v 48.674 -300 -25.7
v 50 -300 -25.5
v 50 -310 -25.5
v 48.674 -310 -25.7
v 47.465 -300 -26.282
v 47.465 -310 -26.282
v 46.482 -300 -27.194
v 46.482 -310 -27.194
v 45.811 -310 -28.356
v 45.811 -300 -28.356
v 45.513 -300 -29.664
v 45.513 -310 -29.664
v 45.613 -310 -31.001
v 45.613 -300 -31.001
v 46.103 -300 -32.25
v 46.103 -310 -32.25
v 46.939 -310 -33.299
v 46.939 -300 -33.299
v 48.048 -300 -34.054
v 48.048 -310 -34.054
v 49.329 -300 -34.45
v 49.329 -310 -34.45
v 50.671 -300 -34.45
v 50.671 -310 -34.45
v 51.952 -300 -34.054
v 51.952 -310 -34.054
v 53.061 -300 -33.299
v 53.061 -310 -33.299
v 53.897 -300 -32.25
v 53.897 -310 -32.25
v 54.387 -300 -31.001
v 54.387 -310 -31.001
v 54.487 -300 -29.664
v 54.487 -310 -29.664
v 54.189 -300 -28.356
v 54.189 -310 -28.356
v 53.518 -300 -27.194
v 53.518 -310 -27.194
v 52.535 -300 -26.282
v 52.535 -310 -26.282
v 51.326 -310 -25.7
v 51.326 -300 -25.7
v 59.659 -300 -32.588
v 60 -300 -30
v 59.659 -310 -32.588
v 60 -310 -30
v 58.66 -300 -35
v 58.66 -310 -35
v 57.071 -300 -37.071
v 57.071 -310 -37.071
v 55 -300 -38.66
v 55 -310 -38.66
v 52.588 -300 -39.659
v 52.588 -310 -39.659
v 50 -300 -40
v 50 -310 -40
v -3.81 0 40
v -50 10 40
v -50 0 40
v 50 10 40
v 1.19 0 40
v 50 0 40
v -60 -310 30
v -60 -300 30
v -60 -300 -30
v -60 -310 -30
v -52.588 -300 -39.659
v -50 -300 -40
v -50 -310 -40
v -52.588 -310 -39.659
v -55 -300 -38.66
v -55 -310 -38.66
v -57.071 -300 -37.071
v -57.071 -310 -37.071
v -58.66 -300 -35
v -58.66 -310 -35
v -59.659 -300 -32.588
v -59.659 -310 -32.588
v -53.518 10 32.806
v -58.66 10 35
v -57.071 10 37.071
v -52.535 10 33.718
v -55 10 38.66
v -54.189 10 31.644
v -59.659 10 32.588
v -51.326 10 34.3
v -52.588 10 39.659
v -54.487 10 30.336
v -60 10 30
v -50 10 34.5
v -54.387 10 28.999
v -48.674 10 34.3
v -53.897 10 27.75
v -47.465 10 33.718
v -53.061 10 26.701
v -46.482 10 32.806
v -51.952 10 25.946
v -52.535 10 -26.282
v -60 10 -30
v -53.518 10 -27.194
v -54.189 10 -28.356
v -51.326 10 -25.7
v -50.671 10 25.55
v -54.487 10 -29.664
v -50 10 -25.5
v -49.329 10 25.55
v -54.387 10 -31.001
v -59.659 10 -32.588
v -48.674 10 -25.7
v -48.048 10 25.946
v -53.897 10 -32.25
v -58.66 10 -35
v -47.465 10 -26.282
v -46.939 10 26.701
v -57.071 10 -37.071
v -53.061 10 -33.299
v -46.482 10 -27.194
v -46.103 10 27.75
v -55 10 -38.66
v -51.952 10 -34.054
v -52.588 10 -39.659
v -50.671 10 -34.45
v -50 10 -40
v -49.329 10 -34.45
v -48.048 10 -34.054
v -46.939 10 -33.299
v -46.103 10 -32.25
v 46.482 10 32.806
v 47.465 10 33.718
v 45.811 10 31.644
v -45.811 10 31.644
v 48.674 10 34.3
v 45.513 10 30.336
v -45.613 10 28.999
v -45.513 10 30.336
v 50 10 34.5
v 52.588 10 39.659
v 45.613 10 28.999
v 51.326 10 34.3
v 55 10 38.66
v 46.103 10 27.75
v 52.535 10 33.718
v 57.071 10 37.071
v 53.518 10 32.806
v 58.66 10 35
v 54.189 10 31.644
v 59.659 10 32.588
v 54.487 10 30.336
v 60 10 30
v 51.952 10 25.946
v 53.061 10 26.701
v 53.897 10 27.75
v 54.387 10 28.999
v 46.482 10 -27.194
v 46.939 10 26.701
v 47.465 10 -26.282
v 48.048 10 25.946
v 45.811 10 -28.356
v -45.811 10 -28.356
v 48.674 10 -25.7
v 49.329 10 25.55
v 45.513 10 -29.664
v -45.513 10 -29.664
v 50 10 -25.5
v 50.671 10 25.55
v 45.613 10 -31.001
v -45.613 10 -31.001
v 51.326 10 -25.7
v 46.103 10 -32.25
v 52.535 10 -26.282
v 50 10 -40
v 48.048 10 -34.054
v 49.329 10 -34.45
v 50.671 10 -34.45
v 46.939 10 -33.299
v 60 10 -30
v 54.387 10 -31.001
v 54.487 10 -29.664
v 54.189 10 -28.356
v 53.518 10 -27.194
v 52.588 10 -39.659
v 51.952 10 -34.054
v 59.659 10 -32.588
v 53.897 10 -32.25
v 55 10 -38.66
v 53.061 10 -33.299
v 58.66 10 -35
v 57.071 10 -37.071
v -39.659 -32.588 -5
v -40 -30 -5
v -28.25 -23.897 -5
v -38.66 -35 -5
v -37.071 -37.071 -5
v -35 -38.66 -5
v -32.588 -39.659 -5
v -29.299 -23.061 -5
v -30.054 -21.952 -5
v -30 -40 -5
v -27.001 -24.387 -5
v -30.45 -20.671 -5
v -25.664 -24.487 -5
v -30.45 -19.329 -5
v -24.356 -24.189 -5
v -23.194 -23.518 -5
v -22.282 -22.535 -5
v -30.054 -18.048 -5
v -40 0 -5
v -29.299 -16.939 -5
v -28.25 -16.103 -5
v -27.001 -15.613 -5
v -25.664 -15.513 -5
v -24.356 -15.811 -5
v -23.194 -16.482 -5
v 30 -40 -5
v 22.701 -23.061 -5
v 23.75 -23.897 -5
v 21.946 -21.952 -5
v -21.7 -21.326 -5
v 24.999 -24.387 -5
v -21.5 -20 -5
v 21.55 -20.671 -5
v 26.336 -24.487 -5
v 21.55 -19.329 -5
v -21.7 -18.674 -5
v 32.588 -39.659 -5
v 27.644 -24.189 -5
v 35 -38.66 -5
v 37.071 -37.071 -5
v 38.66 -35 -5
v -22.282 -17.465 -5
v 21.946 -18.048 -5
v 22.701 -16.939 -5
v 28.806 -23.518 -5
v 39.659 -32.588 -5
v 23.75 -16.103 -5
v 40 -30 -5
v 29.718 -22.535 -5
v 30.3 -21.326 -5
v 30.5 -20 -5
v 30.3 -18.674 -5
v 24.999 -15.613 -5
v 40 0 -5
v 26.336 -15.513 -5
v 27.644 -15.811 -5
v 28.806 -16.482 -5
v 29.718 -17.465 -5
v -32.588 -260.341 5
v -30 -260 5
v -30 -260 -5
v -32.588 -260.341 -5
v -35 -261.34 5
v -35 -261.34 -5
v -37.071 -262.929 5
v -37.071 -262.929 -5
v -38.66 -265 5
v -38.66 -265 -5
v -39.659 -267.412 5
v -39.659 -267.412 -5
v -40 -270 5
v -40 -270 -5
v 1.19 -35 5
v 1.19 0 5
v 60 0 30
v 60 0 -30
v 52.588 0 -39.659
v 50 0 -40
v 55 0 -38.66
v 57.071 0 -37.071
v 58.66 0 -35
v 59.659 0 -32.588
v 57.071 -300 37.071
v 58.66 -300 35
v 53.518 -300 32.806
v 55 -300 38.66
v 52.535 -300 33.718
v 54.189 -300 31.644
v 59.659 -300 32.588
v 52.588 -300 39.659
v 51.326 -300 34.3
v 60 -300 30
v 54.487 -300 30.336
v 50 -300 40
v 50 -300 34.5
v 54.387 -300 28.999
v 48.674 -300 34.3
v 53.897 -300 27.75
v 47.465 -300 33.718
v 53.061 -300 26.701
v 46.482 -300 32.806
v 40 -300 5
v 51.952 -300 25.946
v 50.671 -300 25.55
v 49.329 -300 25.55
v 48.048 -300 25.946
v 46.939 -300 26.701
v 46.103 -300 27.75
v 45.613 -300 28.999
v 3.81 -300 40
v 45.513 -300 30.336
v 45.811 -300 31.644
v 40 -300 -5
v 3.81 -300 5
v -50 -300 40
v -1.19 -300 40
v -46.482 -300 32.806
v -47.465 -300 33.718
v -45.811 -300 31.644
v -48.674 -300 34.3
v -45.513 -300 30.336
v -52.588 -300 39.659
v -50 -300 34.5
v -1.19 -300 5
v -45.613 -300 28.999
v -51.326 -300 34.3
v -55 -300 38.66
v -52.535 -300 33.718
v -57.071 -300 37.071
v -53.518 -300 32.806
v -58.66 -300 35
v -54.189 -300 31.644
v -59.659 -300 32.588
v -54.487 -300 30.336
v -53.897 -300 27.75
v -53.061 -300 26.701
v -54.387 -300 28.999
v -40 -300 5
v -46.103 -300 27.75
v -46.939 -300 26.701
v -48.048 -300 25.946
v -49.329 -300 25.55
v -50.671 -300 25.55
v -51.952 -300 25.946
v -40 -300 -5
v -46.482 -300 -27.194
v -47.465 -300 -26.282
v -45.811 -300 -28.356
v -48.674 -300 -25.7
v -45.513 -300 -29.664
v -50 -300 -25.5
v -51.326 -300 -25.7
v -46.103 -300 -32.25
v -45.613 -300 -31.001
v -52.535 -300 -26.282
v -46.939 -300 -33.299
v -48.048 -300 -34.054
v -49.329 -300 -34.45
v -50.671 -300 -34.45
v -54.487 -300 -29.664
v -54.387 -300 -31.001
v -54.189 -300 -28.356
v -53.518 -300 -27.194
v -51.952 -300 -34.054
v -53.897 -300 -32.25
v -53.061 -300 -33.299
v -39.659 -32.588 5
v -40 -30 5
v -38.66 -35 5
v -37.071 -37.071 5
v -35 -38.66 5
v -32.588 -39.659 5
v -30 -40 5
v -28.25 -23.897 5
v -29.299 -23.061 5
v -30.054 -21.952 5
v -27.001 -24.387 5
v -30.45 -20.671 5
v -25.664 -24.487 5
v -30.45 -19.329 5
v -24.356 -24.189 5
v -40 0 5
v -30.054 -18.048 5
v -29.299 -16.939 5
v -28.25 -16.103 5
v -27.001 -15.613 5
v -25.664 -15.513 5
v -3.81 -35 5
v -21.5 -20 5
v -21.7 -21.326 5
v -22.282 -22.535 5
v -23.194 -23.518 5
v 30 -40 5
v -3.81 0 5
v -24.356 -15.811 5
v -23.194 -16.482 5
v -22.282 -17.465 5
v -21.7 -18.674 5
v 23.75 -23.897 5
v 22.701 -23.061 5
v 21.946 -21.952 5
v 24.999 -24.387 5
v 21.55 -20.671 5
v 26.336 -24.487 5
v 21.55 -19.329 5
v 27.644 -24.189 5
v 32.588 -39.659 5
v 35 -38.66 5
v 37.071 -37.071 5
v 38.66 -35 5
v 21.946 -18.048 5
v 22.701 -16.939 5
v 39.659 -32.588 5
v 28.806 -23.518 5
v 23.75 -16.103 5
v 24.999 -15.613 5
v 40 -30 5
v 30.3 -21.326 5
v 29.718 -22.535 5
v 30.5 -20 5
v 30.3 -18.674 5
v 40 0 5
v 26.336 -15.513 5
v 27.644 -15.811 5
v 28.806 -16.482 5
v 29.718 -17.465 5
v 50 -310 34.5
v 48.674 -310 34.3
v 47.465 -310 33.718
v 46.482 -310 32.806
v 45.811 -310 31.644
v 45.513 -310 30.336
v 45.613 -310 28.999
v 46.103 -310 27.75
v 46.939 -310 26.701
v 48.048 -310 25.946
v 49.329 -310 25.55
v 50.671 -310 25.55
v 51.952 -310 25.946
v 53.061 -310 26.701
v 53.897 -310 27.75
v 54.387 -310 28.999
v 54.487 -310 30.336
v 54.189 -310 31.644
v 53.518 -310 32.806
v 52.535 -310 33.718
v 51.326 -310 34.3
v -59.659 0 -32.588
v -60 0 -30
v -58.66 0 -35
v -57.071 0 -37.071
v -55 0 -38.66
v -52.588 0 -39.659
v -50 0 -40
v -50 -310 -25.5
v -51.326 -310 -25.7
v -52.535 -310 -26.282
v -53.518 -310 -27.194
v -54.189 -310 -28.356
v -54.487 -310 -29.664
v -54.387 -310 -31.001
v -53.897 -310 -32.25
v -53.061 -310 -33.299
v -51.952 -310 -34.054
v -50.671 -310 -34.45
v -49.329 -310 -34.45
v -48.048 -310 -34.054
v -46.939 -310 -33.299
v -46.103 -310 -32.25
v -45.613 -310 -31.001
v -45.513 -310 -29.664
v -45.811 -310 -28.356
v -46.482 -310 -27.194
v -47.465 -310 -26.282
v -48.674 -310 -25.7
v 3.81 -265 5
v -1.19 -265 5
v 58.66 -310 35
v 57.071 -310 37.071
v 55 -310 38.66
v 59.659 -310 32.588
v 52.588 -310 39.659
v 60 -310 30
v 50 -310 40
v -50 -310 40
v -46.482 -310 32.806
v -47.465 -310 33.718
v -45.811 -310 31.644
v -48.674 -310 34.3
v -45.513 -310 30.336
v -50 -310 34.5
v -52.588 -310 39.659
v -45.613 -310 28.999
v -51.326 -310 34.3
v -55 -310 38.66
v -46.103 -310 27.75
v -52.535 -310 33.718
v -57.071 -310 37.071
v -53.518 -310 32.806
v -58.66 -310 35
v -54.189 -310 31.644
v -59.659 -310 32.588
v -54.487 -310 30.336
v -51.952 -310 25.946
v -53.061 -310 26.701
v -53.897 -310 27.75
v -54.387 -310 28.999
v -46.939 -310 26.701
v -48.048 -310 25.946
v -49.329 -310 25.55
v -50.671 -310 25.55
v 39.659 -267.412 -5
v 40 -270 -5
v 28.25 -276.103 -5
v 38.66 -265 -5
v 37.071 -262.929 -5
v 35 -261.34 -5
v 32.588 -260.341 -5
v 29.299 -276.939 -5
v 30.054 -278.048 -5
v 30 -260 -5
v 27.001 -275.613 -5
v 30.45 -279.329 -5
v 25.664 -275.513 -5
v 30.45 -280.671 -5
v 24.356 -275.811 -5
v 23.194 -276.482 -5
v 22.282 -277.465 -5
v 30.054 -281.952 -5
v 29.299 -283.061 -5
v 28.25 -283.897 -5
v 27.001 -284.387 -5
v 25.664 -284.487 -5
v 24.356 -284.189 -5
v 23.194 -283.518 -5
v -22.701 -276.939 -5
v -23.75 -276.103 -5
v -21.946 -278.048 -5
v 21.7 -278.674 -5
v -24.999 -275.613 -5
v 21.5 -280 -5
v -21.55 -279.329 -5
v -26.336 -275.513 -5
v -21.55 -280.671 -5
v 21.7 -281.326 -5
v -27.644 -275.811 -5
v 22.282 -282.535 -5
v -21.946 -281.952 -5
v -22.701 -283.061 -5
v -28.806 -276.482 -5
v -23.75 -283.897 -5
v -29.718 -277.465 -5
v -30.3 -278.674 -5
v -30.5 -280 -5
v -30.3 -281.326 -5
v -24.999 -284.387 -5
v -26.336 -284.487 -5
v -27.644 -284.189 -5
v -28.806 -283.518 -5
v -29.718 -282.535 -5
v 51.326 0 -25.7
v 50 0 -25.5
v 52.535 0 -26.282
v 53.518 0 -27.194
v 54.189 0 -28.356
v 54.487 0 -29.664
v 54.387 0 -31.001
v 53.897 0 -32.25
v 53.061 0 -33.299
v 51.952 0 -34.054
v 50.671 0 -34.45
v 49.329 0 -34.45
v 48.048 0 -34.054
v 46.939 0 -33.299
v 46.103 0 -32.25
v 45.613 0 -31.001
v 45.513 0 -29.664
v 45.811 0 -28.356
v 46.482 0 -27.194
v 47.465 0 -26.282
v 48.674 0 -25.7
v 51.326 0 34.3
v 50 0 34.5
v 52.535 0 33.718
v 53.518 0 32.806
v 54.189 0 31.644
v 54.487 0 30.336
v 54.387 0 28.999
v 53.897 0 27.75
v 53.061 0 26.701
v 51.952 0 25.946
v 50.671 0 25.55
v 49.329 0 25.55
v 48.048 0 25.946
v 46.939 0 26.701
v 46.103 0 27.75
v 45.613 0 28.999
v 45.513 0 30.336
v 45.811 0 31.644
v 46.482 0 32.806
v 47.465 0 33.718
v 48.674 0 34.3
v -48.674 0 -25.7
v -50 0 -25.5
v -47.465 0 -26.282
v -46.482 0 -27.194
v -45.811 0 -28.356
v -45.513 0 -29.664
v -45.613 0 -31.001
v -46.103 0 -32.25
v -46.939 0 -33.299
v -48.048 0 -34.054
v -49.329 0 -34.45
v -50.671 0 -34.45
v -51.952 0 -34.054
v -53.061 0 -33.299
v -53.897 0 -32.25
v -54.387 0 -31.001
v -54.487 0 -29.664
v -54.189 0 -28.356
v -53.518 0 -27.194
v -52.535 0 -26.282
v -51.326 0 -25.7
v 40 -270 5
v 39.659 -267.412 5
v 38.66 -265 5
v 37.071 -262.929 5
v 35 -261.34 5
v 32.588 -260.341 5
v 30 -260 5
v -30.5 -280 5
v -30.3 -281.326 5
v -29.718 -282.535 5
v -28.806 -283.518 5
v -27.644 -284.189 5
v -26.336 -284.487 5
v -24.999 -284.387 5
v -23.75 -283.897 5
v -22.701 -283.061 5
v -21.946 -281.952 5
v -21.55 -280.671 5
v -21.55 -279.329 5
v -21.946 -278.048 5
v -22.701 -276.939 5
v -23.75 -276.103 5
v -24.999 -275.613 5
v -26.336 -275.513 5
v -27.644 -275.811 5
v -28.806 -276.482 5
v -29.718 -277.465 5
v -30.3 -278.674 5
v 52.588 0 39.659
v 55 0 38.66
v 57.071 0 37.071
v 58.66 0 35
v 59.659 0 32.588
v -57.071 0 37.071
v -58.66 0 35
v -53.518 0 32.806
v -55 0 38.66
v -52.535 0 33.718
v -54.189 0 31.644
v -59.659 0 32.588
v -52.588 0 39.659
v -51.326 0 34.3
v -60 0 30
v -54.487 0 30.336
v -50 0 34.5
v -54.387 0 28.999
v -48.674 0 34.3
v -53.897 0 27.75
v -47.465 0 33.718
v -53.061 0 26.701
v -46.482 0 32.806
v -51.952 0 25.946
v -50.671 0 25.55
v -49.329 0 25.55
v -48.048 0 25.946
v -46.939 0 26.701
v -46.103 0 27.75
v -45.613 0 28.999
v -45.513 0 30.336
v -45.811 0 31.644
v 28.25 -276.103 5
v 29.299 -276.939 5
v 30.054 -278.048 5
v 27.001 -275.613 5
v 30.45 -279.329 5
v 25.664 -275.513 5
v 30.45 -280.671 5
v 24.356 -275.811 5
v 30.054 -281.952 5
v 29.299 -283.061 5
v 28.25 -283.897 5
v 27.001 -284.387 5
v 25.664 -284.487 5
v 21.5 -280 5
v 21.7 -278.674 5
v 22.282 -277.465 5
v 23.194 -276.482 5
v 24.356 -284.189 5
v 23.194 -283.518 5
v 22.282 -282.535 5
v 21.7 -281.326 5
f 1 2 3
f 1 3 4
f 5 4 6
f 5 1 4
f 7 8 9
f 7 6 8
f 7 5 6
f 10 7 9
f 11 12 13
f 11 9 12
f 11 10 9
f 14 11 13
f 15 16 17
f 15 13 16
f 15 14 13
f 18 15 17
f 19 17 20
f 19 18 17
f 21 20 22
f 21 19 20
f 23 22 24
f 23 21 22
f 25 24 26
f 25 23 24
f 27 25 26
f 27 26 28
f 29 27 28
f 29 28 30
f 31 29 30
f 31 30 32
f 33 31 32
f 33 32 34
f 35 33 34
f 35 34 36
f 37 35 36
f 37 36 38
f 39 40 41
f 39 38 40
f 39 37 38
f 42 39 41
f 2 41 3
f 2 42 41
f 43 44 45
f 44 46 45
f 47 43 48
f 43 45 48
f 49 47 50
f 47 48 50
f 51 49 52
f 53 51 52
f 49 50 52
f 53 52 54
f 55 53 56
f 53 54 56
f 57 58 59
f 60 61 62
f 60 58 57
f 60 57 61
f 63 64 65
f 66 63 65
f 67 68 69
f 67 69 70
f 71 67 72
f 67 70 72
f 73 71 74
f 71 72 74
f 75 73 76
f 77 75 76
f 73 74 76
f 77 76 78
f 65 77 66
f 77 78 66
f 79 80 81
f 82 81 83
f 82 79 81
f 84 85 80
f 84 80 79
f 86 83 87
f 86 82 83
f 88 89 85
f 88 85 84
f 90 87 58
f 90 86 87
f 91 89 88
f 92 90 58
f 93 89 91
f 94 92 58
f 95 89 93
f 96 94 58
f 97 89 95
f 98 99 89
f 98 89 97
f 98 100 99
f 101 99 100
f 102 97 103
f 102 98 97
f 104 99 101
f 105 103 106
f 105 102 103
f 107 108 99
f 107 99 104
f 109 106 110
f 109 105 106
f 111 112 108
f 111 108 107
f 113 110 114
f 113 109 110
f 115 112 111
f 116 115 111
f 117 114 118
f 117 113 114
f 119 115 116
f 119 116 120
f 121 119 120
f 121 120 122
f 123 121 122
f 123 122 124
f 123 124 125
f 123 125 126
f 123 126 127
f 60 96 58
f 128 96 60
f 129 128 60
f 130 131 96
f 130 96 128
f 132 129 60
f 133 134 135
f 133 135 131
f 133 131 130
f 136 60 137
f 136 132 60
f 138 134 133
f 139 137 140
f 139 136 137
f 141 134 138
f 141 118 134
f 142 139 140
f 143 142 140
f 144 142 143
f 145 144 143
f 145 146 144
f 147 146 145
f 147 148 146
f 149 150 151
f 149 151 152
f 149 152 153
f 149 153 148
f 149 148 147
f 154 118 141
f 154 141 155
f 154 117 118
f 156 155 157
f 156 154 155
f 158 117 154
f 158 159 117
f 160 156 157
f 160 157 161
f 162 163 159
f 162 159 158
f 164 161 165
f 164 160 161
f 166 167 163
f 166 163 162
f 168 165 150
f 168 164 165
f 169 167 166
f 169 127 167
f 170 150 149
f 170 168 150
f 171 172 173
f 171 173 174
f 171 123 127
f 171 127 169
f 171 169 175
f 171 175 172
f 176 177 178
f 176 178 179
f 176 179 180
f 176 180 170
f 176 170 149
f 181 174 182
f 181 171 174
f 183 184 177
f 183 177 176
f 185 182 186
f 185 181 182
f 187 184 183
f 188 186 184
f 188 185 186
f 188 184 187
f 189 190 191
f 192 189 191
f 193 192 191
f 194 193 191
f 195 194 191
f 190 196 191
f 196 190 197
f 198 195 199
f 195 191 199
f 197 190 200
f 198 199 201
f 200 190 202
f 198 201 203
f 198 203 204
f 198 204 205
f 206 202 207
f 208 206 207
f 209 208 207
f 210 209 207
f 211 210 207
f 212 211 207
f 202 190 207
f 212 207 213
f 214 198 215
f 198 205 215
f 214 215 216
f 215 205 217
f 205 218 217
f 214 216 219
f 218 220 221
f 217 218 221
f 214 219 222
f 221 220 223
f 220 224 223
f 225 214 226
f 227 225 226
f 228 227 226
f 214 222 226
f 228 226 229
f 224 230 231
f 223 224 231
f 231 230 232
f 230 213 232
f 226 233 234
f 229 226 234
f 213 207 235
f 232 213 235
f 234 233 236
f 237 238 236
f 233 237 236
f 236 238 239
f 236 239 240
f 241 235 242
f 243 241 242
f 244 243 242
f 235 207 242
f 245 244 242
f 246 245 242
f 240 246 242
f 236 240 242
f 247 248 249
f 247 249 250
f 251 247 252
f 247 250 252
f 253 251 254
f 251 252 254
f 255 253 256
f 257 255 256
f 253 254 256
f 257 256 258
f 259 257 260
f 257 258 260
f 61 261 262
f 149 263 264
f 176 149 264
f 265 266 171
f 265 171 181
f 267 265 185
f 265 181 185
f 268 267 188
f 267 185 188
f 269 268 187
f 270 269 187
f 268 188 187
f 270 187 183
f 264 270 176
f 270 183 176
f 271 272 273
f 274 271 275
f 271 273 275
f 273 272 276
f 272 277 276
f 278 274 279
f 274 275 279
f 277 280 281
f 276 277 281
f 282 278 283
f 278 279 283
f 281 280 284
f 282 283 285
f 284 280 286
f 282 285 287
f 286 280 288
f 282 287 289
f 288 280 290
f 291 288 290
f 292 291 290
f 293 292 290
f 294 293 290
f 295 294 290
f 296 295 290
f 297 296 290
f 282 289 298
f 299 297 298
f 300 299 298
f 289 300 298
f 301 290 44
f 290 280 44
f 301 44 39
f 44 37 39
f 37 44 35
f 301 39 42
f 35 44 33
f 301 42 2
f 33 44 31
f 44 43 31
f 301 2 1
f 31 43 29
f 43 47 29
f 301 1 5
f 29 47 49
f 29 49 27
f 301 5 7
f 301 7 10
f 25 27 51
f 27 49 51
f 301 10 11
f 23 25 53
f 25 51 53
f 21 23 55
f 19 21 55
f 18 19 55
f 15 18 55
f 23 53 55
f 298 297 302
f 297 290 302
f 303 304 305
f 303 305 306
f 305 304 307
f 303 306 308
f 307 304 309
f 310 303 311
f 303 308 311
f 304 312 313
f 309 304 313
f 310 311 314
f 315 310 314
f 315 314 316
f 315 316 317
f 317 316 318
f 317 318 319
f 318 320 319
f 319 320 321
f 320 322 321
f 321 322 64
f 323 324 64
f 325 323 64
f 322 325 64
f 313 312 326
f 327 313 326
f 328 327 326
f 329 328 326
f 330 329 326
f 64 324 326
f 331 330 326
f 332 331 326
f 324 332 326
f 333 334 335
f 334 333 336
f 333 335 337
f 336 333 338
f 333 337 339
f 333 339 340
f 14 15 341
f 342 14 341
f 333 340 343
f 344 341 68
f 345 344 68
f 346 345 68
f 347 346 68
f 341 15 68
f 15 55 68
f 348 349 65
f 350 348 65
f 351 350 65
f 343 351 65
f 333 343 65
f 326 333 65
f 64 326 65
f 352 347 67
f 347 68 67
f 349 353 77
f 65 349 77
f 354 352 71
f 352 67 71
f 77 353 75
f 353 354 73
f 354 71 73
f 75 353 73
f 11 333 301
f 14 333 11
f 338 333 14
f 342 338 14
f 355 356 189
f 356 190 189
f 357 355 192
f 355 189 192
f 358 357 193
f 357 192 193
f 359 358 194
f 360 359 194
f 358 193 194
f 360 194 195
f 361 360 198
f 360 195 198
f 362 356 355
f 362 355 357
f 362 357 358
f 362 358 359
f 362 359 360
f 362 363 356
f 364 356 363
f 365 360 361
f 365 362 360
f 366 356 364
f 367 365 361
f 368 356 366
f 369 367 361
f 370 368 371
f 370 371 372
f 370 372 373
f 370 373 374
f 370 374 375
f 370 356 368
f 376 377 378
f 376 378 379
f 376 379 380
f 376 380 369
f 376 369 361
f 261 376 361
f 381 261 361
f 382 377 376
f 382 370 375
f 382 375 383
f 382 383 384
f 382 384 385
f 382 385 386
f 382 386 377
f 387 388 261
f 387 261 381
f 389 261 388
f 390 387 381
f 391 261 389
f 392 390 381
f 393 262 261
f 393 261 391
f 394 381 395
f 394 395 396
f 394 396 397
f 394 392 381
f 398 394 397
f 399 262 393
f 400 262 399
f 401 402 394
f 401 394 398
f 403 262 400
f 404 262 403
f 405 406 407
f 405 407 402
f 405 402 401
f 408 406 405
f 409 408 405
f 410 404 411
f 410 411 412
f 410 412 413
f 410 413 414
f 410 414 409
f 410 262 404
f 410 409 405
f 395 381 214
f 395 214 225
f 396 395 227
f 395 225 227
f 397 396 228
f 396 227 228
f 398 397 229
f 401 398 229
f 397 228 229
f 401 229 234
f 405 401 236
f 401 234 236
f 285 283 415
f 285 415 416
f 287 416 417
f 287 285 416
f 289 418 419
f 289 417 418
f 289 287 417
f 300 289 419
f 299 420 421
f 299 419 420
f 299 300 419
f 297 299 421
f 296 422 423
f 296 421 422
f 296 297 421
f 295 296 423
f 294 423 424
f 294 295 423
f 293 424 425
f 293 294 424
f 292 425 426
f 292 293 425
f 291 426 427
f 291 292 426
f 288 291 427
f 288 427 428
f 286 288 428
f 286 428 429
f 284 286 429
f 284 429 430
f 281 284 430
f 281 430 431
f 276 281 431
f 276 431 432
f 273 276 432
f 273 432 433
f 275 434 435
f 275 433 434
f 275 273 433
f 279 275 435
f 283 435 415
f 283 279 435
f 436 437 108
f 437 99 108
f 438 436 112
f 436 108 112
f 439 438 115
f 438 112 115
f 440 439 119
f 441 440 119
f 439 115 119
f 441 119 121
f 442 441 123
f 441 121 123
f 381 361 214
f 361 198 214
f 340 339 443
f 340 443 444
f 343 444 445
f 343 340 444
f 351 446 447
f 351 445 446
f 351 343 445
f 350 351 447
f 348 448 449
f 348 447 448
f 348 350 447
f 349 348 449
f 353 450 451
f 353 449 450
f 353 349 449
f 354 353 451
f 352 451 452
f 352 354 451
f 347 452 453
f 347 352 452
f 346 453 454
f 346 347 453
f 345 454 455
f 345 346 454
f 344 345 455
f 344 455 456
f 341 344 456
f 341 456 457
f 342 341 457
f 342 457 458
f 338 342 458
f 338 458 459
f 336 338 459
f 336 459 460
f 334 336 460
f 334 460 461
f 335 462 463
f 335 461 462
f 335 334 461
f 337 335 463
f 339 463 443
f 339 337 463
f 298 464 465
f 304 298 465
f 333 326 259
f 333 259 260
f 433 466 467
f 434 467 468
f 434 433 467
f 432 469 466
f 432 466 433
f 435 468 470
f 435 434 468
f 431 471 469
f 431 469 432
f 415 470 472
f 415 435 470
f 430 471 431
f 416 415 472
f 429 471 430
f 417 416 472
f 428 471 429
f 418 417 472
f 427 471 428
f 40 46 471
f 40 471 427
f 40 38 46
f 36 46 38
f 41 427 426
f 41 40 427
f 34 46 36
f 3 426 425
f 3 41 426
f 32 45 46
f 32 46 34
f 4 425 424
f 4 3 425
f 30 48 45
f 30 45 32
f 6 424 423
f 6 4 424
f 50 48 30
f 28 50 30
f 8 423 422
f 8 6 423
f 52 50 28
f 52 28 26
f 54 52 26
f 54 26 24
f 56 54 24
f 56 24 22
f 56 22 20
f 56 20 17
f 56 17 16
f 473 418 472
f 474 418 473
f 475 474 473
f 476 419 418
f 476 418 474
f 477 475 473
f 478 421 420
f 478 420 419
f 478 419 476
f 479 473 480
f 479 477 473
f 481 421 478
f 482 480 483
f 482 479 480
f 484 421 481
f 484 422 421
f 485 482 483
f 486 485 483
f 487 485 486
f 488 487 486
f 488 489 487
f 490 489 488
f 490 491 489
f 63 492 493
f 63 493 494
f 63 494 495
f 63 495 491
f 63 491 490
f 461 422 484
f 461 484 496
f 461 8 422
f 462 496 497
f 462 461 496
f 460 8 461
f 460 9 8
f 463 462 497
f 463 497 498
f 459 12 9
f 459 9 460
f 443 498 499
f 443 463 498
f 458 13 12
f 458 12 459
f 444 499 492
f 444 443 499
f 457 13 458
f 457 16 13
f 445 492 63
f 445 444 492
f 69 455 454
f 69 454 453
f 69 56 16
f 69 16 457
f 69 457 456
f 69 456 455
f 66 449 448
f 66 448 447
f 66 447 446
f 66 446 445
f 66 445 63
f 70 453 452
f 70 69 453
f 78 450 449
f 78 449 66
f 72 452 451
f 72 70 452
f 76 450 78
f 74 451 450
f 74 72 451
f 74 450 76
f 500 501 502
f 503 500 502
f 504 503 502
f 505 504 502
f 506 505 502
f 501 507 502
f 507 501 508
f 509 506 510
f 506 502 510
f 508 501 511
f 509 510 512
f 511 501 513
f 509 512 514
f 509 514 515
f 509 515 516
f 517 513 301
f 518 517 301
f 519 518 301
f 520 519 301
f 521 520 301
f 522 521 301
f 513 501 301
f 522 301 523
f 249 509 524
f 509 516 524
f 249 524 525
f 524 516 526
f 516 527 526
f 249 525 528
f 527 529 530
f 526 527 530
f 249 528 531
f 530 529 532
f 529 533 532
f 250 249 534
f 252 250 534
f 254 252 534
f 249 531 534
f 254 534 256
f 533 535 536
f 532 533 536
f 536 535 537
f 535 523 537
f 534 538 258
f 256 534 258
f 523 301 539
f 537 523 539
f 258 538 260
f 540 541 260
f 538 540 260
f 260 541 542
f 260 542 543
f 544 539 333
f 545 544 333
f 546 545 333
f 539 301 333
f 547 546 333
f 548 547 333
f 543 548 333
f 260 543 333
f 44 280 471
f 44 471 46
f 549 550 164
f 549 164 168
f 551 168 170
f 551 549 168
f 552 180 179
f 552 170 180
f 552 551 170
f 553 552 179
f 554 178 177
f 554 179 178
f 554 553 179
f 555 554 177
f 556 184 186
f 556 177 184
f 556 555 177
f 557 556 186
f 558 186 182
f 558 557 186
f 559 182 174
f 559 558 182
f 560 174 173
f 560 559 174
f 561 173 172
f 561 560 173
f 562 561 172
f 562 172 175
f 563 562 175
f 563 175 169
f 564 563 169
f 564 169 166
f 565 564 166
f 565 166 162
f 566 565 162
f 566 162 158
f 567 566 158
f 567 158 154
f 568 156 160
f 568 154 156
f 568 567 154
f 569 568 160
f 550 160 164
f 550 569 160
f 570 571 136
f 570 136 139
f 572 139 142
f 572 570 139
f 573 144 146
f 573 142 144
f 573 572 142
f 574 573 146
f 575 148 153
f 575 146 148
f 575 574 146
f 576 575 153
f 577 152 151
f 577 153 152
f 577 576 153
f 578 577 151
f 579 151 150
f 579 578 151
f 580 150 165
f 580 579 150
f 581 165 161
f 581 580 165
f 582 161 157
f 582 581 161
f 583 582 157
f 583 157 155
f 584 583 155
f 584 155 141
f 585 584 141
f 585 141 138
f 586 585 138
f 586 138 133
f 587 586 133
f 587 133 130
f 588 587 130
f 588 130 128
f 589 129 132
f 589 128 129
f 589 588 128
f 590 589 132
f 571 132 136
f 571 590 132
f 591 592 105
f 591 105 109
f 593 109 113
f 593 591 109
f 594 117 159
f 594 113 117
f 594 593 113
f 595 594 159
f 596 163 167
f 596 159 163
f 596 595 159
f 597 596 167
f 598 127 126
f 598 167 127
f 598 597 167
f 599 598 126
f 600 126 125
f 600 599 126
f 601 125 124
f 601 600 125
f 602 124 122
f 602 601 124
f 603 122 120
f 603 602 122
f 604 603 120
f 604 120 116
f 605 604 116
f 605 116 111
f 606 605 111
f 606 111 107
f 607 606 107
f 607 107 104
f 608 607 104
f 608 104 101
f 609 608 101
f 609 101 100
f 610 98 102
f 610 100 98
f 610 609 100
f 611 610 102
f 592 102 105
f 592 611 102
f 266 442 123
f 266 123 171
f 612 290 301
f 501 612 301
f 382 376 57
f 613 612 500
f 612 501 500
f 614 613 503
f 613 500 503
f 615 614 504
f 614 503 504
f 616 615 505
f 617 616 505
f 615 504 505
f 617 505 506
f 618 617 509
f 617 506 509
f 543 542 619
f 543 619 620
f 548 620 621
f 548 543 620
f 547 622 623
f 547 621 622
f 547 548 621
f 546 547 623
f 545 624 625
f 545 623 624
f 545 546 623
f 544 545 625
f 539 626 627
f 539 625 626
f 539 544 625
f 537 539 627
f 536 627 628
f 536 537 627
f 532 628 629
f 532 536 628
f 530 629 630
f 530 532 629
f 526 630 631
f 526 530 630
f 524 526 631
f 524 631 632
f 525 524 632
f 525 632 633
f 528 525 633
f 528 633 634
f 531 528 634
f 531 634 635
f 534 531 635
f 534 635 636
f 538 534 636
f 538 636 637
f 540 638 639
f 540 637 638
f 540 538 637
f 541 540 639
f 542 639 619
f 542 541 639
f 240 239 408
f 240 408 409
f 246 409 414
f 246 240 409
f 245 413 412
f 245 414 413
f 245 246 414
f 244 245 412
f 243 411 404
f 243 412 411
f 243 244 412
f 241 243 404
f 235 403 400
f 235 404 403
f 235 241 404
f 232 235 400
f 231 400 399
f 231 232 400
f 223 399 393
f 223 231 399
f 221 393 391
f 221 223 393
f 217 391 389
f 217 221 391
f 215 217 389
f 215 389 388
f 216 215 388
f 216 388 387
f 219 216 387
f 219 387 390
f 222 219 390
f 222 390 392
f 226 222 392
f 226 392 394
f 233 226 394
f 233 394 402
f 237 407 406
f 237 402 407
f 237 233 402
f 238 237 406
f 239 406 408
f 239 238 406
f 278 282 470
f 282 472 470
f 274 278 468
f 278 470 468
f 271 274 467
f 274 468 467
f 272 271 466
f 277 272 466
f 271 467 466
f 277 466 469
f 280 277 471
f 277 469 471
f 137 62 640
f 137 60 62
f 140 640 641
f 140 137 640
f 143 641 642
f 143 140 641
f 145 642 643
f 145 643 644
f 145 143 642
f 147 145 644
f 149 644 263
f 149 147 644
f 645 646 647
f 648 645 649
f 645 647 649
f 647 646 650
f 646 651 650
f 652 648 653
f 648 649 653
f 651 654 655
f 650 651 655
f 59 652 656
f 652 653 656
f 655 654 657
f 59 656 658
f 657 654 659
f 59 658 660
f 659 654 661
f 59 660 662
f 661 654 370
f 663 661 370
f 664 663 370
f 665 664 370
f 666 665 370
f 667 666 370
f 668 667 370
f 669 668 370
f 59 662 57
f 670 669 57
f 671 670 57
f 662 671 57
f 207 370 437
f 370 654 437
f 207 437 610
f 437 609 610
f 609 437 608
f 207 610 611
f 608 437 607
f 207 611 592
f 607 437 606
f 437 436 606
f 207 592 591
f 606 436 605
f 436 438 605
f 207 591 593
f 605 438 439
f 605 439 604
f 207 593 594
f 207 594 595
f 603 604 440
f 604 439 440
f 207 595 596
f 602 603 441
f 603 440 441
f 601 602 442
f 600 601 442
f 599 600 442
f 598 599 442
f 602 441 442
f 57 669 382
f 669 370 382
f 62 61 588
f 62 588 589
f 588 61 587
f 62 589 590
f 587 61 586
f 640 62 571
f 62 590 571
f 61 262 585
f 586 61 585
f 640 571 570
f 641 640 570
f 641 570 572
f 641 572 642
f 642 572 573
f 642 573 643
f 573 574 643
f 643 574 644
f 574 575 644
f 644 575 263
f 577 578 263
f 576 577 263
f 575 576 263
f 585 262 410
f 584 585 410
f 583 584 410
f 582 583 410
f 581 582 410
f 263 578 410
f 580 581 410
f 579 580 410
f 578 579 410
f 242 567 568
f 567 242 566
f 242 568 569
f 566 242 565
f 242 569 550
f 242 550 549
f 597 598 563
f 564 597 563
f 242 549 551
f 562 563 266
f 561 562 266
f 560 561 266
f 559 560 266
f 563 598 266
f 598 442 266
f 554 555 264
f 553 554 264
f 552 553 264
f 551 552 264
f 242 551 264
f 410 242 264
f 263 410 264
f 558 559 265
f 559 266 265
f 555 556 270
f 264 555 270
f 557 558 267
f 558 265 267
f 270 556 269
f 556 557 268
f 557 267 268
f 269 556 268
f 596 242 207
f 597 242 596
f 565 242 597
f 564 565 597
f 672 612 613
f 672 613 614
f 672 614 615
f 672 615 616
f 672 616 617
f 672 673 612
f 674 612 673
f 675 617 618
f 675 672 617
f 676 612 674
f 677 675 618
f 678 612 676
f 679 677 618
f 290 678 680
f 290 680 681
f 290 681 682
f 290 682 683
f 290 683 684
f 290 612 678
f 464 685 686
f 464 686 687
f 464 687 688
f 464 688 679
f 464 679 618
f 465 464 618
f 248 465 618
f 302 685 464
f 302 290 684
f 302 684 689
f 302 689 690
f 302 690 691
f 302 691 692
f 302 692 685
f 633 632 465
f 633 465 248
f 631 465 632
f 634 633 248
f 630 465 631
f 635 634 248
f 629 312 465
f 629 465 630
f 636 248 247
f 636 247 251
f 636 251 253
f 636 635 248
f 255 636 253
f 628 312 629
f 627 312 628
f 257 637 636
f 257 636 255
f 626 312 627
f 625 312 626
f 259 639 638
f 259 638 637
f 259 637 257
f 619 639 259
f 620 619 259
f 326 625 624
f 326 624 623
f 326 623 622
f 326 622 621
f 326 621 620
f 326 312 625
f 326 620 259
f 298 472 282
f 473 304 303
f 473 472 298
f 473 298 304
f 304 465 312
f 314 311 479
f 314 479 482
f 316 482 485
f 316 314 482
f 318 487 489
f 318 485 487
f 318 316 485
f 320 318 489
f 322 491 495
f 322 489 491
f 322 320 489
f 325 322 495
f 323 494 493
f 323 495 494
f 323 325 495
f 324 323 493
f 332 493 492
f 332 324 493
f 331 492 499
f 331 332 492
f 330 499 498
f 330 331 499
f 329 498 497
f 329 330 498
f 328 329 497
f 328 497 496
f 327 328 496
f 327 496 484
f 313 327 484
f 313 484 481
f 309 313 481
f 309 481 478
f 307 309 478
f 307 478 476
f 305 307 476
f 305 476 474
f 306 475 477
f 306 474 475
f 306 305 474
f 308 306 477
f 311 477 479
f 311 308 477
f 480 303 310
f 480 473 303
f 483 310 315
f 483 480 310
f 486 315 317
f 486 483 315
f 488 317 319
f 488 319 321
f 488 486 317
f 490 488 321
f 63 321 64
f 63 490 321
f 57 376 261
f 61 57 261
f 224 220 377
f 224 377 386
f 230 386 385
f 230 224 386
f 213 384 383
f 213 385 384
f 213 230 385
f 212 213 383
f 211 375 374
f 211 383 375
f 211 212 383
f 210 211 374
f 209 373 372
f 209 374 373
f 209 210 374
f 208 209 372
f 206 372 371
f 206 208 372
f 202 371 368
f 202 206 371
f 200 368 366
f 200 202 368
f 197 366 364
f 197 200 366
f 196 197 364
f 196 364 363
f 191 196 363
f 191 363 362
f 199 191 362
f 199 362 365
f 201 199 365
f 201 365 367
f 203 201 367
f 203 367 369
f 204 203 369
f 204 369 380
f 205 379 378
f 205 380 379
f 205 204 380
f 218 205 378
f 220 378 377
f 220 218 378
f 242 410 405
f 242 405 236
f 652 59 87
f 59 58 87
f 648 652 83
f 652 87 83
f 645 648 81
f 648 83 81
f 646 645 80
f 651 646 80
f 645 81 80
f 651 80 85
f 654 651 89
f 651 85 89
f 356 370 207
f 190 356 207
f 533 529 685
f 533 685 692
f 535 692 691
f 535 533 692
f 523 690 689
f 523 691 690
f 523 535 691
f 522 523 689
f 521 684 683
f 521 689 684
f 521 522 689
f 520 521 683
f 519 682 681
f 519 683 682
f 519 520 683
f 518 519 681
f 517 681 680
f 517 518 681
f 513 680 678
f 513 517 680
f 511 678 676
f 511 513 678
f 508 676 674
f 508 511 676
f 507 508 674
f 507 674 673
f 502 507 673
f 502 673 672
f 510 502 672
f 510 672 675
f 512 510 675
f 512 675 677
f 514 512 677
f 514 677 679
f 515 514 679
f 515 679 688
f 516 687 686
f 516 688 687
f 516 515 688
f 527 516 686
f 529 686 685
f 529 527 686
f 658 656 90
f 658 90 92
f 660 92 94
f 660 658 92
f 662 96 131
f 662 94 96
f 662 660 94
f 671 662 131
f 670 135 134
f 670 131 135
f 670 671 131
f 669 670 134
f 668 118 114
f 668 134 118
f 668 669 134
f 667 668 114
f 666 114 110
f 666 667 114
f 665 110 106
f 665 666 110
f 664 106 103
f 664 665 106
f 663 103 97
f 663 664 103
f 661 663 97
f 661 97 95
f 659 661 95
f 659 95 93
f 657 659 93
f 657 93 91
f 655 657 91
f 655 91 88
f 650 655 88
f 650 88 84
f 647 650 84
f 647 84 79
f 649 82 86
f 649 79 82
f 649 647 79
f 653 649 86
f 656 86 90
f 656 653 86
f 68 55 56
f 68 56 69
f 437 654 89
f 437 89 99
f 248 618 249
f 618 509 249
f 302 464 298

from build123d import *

# Parameters (mm, degrees)
SKETCH1_W               = 120
SKETCH1_H               = 80
BOSS_EXTRUDE1_DEPTH     = 10
FILLET1_R               = 10
FILLET2_R               = 10
FILLET3_R               = 10
FILLET4_R               = 10
CUT_EXTRUDE1_DEPTH      = 73.801098893
CUT_EXTRUDE1_DEPTH_BACK = 73.801098893
SKETCH2_R               = 4.5
SKETCH3_W               = 80
SKETCH3_H               = 10
BOSS_EXTRUDE2_DEPTH     = 40
FILLET5_R               = 10
FILLET6_R               = 10
CUT_EXTRUDE2_DEPTH      = 83.462112512
CUT_EXTRUDE2_DEPTH_BACK = 83.462112512
SKETCH4_R               = 4.5
CUT_EXTRUDE3_DEPTH      = 83.462112512
CUT_EXTRUDE3_DEPTH_BACK = 83.462112512
SKETCH9_R               = 4.5
SKETCH10_W              = 5
SKETCH10_H              = 35
BOSS_EXTRUDE4_DEPTH     = 40
CHAMFER10_START         = -54
CHAMFER10_OUTLINE_W     = 5
CHAMFER10_OUTLINE_H     = 49.497474683
CHAMFER10_DEPTH         = 25.715728753
BODY_MOVE_COPY4_ANGLE   = 180


with BuildPart() as part:
    # Sketch1 → Boss-Extrude1 (new body)
    with BuildSketch(Plane(origin=(0, 0, 0), x_dir=(1, 0, 0), z_dir=(0, 1, 0))):
        Rectangle(SKETCH1_W, SKETCH1_H)
    extrude(amount=BOSS_EXTRUDE1_DEPTH)

    # Fillet1
    fillet1_edges = [part.edges().sort_by_distance(p)[0] for p in [
        (60, 5, 40),
    ]]
    fillet(fillet1_edges, radius=FILLET1_R)

    # Fillet2
    fillet2_edges = [part.edges().sort_by_distance(p)[0] for p in [
        (-60, 5, 40),
    ]]
    fillet(fillet2_edges, radius=FILLET2_R)

    # Fillet3
    fillet3_edges = [part.edges().sort_by_distance(p)[0] for p in [
        (-60, 5, -40),
    ]]
    fillet(fillet3_edges, radius=FILLET3_R)

    # Fillet4
    fillet4_edges = [part.edges().sort_by_distance(p)[0] for p in [
        (60, 5, -40),
    ]]
    fillet(fillet4_edges, radius=FILLET4_R)

    # Sketch2 → Cut-Extrude1 (cut, two sides: drawn at the far end of the back side and taken through both)
    with BuildSketch(Plane(origin=(0, 0, 0), x_dir=(1, 0, 0), z_dir=(0, 1, 0)).offset(-CUT_EXTRUDE1_DEPTH_BACK)):
        with Locations(Location((-50, 30, 0), (0, 0, 270))):
            Circle(SKETCH2_R)
        with Locations(Location((-50, -30, 0), (0, 0, 270))):
            Circle(SKETCH2_R)
        with Locations(Location((50, -30, 0), (0, 0, 270))):
            Circle(SKETCH2_R)
        with Locations(Location((50, 30, 0), (0, 0, 270))):
            Circle(SKETCH2_R)
    extrude(amount=CUT_EXTRUDE1_DEPTH + CUT_EXTRUDE1_DEPTH_BACK, mode=Mode.SUBTRACT)

    # Sketch3 → Boss-Extrude2 (add)
    with BuildSketch(Plane(origin=(0, 0, 0), x_dir=(1, 0, 0), z_dir=(0, 1, 0))):
        Rectangle(SKETCH3_W, SKETCH3_H)
    extrude(amount=-BOSS_EXTRUDE2_DEPTH)

    # Fillet5
    fillet5_edges = [part.edges().sort_by_distance(p)[0] for p in [
        (-40, -40, 0),
    ]]
    fillet(fillet5_edges, radius=FILLET5_R)

    # Fillet6
    fillet6_edges = [part.edges().sort_by_distance(p)[0] for p in [
        (40, -40, 0),
    ]]
    fillet(fillet6_edges, radius=FILLET6_R)

    # Sketch4 → Cut-Extrude2 (cut, two sides: drawn at the far end of the back side and taken through both)
    with BuildSketch(Plane.XY.offset(-CUT_EXTRUDE2_DEPTH_BACK)):
        with Locations((-26, -20)):
            Circle(SKETCH4_R)
    extrude(amount=CUT_EXTRUDE2_DEPTH + CUT_EXTRUDE2_DEPTH_BACK, mode=Mode.SUBTRACT)

    # Sketch9 → Cut-Extrude3 (cut, two sides: drawn at the far end of the back side and taken through both)
    with BuildSketch(Plane.XY.offset(-CUT_EXTRUDE3_DEPTH_BACK)):
        with Locations((26, -20)):
            Circle(SKETCH9_R)
    extrude(amount=CUT_EXTRUDE3_DEPTH + CUT_EXTRUDE3_DEPTH_BACK, mode=Mode.SUBTRACT)

    # Sketch10 → Boss-Extrude4 (add)
    with BuildSketch(Plane.XY):
        with Locations((-1.309595444, -17.5)):
            Rectangle(SKETCH10_W, SKETCH10_H)
    extrude(amount=BOSS_EXTRUDE4_DEPTH)

    # Chamfer10: read off the stored shape, not the designer's step
    # Chamfer10 outline → Chamfer10 (cut)
    with BuildSketch(Plane(origin=(0, 0, 0), x_dir=(1, 0, 0), z_dir=(0, 0.7071067811865476, -0.7071067811865476)).offset(CHAMFER10_START)):
        with Locations((-1.309595444, -3.535533906)):
            Rectangle(CHAMFER10_OUTLINE_W, CHAMFER10_OUTLINE_H)
    extrude(amount=CHAMFER10_DEPTH, mode=Mode.SUBTRACT)


with BuildPart() as body_2:
    # Body-Move/Copy4: copy of part
    add(part.part.rotate(Axis((0, -150, 0), (0, 0, 1)), BODY_MOVE_COPY4_ANGLE))


solid = Compound([part.part, body_2.part])
